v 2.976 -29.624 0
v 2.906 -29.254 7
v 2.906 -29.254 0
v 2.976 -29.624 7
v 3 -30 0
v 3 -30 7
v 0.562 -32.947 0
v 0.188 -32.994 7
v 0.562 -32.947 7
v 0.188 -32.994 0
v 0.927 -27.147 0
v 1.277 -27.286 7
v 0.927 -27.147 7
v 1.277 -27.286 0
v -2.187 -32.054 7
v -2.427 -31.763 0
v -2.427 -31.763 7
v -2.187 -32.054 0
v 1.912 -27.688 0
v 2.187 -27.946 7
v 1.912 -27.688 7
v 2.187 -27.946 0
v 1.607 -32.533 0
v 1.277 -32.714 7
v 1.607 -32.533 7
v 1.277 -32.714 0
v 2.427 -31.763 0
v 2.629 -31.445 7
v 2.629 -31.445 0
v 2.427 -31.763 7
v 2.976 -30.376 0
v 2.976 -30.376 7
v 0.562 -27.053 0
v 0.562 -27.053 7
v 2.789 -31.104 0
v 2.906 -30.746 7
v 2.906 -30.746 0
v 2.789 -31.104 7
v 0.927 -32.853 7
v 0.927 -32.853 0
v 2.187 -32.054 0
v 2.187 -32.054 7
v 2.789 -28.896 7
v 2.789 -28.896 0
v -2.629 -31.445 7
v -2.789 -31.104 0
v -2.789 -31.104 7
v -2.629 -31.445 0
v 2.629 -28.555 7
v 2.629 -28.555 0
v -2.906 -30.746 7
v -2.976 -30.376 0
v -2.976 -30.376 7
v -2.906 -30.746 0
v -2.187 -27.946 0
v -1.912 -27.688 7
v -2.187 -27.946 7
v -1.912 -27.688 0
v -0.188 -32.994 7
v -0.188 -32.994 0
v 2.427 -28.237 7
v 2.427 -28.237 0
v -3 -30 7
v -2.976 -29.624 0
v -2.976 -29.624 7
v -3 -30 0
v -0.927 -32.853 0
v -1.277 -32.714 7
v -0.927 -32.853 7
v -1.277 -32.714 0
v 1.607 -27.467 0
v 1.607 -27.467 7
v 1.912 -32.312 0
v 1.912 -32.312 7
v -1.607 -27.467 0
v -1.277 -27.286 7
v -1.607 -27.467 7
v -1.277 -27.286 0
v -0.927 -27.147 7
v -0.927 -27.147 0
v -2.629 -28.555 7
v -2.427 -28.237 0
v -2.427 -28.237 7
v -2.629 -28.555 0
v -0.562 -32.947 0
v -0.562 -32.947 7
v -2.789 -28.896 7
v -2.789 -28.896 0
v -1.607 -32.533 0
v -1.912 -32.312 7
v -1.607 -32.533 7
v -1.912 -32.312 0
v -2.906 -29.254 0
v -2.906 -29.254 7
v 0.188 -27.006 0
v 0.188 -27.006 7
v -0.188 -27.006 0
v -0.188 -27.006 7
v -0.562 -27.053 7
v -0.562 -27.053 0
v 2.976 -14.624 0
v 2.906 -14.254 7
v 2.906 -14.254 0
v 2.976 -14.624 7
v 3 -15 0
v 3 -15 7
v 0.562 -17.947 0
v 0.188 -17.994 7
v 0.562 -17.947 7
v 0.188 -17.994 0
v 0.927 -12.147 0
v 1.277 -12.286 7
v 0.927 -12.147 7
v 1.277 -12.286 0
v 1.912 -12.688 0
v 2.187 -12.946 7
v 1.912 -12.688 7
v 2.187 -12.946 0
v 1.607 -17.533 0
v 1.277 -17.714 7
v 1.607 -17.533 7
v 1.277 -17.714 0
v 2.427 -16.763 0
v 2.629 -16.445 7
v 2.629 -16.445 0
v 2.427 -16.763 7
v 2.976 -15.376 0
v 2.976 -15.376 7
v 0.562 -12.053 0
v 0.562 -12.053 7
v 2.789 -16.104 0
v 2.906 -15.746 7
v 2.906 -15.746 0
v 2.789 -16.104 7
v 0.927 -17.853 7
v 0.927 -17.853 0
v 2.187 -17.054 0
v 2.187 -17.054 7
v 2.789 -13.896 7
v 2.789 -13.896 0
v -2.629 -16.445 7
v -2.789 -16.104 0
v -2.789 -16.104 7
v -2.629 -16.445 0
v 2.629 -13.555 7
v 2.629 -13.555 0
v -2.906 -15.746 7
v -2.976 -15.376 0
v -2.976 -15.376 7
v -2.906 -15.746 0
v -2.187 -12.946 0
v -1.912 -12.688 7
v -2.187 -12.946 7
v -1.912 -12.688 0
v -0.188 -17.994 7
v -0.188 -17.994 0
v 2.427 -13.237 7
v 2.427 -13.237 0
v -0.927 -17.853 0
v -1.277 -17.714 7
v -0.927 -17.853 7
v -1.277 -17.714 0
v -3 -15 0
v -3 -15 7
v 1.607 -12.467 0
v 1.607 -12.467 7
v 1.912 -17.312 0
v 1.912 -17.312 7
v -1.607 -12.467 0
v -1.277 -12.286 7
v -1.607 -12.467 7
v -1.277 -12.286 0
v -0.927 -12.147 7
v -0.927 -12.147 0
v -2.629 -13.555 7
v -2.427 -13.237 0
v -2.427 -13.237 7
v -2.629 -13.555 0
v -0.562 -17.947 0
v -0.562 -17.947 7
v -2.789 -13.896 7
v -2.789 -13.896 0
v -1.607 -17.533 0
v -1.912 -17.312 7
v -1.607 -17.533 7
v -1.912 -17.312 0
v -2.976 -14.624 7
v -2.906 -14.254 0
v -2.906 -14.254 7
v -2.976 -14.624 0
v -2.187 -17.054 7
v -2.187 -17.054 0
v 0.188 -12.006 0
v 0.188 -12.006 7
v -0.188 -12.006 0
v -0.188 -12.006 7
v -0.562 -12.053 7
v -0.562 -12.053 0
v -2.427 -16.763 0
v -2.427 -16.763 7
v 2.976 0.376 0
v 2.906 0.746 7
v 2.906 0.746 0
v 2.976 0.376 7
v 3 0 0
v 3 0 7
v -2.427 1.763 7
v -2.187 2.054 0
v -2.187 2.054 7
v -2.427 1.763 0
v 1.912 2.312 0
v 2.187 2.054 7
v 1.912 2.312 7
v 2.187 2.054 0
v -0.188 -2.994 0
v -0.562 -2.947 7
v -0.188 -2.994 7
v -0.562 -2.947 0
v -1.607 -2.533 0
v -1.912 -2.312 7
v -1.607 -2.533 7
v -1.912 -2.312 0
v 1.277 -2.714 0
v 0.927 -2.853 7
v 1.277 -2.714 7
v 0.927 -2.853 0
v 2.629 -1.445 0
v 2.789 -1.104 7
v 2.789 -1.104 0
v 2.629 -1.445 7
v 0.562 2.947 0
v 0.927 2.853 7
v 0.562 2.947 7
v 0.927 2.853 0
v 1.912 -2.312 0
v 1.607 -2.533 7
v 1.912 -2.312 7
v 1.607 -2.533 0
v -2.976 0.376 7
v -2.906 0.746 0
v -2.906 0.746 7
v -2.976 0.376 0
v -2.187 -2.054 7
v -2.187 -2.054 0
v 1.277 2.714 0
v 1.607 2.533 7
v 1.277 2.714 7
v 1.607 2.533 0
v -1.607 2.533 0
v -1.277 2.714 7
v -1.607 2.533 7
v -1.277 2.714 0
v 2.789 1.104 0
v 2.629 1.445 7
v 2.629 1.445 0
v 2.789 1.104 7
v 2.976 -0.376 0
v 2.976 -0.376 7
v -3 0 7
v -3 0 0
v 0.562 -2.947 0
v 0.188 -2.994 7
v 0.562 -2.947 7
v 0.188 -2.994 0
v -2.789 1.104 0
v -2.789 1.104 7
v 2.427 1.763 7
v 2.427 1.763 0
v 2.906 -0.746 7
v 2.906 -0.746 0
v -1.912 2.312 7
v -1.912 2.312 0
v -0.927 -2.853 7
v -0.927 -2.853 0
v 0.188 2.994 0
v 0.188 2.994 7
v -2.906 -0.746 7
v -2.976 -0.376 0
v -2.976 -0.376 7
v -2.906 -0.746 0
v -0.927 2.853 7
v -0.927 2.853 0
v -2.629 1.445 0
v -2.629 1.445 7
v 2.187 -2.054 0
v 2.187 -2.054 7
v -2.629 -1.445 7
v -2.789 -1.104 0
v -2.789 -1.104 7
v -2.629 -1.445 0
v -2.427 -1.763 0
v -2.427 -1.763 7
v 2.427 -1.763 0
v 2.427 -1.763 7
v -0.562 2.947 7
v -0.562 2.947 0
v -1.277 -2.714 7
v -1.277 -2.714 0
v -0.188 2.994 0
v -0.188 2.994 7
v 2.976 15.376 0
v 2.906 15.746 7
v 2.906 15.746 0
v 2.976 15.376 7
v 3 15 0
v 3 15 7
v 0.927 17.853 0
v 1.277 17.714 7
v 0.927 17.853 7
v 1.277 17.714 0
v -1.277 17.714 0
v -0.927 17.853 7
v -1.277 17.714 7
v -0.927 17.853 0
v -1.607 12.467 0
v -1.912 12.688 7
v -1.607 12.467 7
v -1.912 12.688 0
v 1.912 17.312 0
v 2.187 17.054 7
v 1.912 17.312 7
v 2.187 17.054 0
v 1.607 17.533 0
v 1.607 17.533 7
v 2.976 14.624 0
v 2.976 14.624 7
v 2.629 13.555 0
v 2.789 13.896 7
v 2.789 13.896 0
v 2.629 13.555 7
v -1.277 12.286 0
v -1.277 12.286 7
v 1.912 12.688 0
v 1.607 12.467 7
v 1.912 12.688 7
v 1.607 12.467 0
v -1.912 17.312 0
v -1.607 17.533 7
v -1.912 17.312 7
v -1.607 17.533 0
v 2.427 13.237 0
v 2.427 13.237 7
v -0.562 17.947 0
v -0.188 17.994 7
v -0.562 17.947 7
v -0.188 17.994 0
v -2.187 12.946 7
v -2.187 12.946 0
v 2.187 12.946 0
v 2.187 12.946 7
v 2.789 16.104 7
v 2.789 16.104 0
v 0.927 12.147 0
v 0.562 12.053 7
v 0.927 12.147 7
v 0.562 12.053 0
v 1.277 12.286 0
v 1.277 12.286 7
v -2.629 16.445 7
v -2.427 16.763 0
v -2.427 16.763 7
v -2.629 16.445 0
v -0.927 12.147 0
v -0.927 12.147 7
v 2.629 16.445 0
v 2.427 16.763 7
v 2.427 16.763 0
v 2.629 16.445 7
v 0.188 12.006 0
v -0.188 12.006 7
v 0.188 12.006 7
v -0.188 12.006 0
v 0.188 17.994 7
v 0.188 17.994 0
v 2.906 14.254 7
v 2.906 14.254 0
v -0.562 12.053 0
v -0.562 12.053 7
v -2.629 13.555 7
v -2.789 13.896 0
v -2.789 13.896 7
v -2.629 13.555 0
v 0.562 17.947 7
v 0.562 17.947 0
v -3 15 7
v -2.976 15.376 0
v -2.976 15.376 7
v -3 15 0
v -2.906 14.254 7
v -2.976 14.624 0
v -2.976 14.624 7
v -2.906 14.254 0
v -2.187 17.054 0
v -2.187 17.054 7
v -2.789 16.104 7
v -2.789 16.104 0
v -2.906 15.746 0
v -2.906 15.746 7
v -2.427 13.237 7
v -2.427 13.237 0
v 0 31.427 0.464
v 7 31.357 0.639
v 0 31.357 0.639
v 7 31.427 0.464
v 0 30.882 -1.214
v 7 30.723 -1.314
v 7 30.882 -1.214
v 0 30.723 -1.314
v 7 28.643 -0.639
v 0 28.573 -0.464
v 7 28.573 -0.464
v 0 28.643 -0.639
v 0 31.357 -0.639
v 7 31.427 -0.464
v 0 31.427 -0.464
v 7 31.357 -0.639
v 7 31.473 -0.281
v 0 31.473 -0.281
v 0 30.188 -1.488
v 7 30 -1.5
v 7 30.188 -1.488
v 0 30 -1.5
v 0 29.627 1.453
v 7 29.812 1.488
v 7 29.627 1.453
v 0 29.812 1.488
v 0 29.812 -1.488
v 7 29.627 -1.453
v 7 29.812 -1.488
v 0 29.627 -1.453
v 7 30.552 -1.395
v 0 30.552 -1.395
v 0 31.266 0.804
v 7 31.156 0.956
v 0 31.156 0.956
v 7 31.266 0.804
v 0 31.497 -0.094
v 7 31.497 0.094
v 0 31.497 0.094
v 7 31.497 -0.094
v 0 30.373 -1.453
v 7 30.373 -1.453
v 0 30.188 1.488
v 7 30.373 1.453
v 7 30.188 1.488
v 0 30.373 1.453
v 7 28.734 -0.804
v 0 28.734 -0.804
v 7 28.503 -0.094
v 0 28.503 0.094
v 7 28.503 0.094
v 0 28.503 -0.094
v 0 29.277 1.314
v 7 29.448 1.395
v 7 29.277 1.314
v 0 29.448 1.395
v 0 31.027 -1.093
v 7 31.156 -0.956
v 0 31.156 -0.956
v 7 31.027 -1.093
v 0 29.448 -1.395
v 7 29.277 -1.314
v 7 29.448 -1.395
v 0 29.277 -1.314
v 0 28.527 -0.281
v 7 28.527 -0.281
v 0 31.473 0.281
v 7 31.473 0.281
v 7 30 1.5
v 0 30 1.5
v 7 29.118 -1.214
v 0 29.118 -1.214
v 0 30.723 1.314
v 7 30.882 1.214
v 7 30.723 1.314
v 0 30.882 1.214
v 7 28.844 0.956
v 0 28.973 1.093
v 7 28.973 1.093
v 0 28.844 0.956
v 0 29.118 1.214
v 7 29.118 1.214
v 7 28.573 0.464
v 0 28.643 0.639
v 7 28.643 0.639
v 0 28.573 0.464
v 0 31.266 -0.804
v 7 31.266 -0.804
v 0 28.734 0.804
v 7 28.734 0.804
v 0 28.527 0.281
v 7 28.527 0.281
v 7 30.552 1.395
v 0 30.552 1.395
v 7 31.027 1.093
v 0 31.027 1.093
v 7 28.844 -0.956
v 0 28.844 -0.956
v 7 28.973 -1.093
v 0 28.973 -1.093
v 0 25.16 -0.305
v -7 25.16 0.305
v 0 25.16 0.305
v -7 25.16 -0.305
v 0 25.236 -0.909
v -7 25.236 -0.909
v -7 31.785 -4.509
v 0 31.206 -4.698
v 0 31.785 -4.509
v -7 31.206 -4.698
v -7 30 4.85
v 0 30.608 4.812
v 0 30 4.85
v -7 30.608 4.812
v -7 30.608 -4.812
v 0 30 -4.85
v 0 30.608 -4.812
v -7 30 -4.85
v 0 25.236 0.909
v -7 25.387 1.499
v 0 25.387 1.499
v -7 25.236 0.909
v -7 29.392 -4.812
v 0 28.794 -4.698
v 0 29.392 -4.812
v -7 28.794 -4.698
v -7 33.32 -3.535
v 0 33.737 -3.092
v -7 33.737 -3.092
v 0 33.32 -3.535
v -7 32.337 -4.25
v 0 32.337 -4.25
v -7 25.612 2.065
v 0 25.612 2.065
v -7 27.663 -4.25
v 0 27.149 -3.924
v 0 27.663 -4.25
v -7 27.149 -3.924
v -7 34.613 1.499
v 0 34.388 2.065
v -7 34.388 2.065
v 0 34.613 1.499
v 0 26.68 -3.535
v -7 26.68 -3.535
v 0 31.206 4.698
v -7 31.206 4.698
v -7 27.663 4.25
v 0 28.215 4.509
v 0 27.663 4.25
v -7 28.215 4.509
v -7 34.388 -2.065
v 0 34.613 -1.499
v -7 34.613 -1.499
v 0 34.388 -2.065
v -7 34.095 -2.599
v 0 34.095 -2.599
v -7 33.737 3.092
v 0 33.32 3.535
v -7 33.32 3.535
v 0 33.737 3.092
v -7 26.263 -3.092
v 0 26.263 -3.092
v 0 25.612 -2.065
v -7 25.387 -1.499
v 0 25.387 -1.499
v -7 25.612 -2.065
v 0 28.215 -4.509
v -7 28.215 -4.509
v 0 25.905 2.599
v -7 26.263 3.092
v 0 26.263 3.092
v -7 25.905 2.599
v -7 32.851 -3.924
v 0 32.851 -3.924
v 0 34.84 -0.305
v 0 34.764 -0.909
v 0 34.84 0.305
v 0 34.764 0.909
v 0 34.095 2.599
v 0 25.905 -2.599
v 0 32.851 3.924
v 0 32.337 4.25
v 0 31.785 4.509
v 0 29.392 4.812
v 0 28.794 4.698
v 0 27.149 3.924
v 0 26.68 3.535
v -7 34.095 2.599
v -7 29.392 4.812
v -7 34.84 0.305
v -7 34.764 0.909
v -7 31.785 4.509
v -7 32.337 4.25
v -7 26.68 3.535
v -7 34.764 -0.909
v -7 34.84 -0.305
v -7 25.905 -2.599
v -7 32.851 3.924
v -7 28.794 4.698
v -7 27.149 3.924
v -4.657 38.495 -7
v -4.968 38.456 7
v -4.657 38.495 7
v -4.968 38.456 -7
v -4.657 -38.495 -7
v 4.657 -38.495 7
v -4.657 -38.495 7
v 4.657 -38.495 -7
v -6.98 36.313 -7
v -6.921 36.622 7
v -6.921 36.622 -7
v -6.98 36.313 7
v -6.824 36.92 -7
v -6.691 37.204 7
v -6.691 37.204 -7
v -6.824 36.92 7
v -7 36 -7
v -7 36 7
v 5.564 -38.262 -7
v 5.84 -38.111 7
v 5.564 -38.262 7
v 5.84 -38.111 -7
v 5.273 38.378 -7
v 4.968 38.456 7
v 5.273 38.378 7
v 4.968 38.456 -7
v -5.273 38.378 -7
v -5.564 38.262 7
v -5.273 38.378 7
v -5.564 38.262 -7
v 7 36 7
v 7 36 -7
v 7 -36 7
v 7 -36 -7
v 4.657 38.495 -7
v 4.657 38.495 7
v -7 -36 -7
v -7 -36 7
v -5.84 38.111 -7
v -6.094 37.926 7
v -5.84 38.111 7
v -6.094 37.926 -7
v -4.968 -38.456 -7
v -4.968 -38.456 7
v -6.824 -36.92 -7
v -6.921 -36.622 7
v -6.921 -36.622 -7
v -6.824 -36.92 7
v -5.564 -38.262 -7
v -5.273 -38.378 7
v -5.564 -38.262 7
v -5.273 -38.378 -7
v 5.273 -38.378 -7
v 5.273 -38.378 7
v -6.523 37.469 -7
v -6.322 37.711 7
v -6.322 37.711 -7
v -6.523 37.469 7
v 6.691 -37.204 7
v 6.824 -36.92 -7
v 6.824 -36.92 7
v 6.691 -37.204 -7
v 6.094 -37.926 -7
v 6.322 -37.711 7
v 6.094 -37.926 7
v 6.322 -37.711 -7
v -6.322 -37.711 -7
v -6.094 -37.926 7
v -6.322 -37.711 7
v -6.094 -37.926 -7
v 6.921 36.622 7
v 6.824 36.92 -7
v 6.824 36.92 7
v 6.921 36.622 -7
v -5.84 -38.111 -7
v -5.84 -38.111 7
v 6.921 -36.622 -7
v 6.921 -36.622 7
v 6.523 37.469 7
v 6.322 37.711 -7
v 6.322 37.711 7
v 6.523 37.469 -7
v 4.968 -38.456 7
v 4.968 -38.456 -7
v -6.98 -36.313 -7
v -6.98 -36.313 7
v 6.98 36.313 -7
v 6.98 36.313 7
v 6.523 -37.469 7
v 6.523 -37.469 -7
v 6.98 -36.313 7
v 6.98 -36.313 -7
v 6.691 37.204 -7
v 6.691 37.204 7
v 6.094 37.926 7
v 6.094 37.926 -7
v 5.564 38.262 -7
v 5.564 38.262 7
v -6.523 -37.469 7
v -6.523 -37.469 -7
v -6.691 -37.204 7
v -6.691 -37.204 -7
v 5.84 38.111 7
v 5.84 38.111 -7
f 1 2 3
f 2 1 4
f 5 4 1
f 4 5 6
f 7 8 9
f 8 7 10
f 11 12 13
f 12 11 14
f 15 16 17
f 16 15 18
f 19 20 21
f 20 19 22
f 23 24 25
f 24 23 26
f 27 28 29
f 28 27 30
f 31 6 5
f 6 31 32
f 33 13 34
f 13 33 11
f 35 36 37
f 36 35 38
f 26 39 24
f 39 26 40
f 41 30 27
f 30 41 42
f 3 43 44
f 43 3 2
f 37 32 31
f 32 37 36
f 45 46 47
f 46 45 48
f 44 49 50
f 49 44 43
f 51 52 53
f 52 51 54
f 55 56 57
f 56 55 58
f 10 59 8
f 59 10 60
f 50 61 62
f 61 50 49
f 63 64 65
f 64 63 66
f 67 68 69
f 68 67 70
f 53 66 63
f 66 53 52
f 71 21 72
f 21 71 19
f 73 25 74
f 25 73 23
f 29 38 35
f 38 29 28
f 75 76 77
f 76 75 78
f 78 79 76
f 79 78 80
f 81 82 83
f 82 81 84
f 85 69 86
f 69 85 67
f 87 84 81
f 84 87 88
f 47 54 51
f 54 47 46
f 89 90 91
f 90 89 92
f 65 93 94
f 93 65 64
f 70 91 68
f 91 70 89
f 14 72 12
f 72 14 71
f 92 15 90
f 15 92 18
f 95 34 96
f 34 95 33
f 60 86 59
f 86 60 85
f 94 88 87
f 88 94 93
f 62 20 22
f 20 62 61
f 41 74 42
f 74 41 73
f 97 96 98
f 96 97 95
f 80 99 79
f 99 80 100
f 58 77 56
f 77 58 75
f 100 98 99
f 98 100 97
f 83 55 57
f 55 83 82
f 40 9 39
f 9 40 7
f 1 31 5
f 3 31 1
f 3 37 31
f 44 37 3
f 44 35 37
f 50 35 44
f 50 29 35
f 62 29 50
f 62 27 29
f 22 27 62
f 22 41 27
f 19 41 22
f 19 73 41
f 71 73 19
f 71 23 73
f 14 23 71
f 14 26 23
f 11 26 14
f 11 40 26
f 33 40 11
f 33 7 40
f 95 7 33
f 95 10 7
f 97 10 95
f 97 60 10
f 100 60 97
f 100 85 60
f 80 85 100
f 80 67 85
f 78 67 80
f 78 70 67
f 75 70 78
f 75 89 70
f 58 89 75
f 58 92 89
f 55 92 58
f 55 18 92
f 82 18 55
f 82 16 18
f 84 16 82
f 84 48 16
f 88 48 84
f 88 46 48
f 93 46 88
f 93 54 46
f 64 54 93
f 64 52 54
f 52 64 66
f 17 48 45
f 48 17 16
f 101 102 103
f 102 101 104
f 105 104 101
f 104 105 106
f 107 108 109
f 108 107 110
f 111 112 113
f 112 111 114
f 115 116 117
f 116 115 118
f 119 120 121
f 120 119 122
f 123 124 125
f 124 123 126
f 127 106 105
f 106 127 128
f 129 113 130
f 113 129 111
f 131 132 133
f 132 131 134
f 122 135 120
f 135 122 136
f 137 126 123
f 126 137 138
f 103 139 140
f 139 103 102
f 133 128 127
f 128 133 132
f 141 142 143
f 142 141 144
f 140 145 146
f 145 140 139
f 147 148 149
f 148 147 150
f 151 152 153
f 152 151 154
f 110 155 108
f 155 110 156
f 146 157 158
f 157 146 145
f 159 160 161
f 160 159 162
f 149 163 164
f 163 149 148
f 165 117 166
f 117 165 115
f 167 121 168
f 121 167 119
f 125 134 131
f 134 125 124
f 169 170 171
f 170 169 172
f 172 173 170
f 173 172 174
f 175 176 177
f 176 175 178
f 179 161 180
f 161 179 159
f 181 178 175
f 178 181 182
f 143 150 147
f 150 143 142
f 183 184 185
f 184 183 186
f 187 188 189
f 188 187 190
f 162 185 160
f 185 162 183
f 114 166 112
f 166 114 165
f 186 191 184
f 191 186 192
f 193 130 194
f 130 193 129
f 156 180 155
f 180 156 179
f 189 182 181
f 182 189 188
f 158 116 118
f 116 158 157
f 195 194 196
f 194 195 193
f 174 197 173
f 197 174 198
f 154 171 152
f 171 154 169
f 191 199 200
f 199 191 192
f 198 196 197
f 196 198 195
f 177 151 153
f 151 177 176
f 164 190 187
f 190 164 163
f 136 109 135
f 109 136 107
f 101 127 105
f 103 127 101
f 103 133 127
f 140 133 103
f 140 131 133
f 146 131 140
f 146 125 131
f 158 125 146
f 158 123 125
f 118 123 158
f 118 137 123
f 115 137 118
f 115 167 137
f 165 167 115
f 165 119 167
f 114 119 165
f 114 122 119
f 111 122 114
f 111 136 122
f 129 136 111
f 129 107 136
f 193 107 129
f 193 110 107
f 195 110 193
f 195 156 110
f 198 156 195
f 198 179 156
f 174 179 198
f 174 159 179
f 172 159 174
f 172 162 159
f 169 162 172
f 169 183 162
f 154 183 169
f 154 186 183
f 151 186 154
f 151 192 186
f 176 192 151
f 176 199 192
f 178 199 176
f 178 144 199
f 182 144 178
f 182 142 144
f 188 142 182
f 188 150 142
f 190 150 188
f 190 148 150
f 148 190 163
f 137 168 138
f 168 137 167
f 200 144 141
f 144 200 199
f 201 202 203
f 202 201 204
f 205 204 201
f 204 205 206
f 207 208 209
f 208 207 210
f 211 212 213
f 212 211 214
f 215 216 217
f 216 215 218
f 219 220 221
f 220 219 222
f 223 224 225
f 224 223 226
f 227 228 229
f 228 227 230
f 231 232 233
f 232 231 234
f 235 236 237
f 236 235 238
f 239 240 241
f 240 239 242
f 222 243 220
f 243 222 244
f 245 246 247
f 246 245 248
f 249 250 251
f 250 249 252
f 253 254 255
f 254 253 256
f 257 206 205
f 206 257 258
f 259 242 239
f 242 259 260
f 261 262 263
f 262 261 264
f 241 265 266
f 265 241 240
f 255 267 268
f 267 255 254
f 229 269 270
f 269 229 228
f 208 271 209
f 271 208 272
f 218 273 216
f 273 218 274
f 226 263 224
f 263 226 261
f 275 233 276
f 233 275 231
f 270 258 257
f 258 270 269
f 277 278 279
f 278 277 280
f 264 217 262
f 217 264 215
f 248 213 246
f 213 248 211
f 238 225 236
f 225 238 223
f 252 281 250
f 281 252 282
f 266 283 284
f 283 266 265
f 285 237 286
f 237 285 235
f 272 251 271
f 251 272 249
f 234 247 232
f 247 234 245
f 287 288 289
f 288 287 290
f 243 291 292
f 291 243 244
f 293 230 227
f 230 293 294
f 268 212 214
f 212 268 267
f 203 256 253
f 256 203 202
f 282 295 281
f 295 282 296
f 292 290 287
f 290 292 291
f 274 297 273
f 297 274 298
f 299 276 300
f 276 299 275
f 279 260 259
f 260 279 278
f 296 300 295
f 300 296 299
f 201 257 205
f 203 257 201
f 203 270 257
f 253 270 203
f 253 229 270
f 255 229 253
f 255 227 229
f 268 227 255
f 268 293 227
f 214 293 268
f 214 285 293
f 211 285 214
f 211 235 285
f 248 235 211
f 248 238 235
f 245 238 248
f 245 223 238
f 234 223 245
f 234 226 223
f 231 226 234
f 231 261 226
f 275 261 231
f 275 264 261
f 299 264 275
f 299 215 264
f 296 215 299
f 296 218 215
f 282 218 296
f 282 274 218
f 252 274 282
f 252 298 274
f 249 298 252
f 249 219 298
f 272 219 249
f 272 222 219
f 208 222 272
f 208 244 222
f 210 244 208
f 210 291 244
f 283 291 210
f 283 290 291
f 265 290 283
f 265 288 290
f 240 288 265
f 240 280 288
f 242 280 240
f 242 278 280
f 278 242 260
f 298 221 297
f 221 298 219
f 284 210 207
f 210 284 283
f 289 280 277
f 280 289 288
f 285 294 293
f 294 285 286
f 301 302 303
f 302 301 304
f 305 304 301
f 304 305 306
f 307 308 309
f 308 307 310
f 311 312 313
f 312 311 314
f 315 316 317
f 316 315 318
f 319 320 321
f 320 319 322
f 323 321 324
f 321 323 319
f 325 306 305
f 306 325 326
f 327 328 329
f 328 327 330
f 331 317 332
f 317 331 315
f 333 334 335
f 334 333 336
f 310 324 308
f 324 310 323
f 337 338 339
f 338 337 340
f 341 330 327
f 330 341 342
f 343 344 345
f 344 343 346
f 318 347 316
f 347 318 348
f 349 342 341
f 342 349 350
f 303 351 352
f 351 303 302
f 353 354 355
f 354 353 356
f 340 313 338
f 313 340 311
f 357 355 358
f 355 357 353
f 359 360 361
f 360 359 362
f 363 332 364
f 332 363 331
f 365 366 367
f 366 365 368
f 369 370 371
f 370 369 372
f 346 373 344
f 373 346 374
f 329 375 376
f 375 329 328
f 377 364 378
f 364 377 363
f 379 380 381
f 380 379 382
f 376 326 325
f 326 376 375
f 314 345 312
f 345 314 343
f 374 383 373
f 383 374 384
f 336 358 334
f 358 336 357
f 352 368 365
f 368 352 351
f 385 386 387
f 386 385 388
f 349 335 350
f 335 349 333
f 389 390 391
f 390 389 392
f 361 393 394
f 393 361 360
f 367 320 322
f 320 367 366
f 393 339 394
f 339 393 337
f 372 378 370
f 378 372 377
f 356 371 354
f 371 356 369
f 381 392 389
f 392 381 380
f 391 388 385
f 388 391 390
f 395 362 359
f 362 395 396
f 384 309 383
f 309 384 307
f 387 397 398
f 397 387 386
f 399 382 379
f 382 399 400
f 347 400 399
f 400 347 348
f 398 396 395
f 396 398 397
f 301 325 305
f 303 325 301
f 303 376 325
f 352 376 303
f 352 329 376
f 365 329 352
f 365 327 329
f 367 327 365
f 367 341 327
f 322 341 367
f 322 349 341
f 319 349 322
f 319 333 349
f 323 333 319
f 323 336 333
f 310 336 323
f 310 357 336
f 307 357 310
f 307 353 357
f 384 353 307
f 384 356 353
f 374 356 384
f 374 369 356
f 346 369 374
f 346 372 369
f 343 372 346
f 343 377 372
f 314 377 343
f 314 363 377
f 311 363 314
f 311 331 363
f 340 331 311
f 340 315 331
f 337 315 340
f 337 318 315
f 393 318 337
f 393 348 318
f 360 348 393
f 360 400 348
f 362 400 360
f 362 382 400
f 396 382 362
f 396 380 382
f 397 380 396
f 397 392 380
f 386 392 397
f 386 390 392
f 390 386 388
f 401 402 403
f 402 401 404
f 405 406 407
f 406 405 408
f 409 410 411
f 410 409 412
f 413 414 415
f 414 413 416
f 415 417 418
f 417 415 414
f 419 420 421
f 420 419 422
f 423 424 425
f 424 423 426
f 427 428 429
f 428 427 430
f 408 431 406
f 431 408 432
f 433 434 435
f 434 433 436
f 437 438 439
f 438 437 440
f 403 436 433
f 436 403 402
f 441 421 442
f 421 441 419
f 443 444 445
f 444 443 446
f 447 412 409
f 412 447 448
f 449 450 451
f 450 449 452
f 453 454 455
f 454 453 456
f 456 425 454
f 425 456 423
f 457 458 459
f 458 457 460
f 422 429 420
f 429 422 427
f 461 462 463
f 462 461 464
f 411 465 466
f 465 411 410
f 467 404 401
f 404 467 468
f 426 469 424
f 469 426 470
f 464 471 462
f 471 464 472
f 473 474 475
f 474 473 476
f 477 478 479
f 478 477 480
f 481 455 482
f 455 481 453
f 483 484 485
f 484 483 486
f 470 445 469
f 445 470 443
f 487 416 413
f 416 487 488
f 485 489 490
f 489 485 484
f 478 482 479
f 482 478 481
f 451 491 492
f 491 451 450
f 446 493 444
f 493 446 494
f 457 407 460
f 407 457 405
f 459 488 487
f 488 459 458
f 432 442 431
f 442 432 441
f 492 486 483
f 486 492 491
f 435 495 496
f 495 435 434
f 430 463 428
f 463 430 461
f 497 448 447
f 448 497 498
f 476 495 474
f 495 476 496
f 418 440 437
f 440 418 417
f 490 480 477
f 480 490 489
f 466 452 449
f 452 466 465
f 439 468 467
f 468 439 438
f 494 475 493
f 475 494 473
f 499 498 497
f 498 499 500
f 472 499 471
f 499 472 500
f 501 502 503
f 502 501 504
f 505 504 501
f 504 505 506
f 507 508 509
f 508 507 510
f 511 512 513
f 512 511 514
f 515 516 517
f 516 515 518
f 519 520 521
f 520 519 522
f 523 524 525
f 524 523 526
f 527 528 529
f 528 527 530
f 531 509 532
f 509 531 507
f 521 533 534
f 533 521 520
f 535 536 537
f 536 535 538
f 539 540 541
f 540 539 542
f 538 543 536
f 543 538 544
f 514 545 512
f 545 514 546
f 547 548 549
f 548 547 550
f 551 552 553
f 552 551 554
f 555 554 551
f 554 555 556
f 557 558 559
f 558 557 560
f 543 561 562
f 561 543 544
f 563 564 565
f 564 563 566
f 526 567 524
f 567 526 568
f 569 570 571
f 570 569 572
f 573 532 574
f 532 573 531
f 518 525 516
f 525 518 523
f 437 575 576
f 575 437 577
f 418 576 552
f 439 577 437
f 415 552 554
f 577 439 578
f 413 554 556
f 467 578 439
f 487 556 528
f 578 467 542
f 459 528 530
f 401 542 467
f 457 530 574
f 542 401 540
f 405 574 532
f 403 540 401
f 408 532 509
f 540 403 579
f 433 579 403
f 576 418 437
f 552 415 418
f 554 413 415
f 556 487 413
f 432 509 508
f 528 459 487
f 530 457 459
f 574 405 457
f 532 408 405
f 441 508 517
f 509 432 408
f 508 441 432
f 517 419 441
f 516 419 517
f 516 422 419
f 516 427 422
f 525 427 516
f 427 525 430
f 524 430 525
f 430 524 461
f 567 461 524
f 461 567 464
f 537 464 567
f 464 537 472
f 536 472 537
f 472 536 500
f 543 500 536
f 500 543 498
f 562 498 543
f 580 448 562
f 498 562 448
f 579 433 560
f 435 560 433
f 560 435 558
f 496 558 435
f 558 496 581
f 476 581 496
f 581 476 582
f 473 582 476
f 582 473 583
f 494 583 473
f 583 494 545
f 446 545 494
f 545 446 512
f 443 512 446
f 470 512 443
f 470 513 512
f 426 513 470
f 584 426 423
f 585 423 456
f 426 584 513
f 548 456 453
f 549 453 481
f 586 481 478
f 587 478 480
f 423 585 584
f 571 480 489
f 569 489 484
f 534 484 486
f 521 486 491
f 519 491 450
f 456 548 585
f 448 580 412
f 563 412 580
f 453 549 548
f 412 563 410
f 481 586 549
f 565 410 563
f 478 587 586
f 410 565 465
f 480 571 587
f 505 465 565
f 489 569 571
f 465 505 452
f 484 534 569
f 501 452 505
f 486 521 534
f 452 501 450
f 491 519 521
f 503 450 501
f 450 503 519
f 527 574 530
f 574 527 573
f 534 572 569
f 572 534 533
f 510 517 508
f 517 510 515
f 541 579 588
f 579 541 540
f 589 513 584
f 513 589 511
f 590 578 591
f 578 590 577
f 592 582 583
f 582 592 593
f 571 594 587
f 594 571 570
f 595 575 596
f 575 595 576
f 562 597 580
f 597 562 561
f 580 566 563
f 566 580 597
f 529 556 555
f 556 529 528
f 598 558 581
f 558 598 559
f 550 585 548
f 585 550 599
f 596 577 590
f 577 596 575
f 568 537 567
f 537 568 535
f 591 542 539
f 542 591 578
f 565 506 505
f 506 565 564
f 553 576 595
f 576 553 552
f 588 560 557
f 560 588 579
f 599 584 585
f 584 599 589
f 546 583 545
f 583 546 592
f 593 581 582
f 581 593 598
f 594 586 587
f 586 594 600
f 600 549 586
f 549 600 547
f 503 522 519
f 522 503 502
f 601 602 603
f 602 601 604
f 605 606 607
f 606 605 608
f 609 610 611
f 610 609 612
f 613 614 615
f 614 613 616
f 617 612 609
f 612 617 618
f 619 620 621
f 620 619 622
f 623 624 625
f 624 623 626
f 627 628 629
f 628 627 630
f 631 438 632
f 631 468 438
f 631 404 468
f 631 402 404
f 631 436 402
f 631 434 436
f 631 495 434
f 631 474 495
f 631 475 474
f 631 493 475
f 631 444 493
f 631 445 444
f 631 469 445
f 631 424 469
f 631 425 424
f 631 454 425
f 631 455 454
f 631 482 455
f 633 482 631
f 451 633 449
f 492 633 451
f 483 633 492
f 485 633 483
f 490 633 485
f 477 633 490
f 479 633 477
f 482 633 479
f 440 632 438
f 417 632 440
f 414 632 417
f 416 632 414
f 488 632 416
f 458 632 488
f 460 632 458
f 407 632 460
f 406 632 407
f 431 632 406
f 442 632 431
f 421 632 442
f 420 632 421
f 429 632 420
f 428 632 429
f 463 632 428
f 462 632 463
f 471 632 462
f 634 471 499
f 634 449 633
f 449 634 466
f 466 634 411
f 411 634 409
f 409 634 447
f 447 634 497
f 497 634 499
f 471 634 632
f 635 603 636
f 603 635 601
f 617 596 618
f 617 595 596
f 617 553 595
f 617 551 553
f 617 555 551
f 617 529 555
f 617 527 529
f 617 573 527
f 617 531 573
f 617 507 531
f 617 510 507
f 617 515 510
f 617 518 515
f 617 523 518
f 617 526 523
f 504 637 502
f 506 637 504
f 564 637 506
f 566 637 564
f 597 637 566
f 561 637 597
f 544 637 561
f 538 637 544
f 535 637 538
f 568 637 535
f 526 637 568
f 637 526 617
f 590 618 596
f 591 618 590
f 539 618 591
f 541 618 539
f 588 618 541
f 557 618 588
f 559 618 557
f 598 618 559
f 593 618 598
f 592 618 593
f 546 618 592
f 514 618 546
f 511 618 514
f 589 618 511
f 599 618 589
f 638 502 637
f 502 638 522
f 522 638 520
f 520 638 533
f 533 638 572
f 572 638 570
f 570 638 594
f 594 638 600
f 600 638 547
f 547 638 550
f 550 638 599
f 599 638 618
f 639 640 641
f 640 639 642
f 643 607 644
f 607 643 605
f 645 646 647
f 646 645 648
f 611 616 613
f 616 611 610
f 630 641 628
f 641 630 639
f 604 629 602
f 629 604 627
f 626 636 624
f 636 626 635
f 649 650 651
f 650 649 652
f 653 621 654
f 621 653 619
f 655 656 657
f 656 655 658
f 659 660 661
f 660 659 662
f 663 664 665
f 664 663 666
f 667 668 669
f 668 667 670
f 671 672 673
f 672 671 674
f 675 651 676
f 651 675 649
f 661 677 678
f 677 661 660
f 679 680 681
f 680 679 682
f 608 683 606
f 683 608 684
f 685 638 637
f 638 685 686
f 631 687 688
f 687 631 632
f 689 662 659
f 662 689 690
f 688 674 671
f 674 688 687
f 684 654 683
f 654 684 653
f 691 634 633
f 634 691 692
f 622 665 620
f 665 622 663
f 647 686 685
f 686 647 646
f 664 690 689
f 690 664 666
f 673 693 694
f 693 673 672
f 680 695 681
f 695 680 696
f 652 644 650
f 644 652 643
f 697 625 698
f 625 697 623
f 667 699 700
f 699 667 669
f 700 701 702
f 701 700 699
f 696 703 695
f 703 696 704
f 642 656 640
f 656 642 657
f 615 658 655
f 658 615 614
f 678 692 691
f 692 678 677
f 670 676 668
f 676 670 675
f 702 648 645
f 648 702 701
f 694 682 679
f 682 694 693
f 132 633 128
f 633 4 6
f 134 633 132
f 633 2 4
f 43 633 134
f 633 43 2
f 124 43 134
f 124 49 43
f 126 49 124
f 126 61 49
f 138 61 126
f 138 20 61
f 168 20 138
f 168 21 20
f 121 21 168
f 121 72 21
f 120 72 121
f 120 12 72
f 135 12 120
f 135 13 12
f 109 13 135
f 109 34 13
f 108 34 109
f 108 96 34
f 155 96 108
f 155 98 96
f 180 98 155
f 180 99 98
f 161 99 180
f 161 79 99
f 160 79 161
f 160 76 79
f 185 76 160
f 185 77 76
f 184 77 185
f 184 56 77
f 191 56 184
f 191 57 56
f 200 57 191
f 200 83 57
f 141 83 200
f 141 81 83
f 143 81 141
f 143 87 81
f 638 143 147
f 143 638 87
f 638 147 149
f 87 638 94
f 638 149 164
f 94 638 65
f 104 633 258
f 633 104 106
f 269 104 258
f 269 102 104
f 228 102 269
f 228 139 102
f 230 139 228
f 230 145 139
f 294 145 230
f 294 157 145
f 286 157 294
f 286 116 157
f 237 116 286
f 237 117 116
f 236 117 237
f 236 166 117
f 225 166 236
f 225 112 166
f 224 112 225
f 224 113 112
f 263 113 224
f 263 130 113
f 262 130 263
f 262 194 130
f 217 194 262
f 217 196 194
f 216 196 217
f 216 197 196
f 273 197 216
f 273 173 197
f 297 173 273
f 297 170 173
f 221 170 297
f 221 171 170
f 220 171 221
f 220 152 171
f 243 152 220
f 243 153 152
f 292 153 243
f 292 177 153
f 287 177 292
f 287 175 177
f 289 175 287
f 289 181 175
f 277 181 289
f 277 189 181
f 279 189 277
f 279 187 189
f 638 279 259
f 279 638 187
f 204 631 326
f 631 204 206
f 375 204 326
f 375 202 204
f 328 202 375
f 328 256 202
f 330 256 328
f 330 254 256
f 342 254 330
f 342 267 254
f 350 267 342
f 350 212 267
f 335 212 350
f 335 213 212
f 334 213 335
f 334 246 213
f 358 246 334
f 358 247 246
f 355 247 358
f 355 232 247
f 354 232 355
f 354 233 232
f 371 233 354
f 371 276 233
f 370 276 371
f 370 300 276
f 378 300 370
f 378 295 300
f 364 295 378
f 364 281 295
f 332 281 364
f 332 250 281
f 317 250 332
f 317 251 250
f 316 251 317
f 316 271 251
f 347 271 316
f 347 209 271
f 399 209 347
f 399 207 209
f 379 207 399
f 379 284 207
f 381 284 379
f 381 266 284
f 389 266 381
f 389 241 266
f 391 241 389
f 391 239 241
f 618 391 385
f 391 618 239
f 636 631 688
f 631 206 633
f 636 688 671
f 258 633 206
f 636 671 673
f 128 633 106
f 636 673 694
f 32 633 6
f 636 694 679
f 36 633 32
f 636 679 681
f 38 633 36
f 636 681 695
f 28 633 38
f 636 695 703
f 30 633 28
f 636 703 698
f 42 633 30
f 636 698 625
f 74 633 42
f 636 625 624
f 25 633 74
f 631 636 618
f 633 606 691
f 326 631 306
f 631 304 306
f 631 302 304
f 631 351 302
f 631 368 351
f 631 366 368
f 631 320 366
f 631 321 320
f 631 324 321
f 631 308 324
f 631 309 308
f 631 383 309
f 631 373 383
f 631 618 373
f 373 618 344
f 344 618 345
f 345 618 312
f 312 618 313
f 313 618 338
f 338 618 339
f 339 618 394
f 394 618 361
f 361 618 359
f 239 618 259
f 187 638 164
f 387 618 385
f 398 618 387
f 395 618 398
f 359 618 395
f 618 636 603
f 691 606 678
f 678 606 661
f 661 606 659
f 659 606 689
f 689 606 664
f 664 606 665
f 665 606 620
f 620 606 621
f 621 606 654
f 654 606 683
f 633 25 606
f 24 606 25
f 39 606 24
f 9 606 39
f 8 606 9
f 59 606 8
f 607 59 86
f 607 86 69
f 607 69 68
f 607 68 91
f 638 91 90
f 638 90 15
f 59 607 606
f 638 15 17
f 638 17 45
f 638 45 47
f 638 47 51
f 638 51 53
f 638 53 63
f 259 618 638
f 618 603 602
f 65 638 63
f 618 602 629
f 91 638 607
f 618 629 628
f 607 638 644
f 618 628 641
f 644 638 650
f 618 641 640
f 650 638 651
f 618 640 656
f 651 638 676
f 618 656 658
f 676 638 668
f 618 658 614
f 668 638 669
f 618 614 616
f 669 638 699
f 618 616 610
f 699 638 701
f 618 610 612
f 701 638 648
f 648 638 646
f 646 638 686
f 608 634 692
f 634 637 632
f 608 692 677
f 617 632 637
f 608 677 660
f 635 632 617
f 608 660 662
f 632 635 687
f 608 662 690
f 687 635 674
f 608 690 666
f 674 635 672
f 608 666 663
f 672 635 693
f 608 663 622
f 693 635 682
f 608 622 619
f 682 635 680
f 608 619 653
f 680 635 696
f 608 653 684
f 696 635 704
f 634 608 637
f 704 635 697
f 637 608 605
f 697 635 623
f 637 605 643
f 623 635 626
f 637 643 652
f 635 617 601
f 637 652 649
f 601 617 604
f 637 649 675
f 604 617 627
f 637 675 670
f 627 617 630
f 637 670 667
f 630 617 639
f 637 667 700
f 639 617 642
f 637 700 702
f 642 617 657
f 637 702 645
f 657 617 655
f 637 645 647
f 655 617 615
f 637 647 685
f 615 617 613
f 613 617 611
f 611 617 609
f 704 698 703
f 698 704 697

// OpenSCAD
$fn = 50;


difference() {
	union() {
		translate(v = [0, 0, -7.0000000000]) {
			hull() {
				translate(v = [-4.5000000000, 36.0000000000, 0]) {
					cylinder(h = 14, r = 2.5000000000);
				}
				translate(v = [4.5000000000, 36.0000000000, 0]) {
					cylinder(h = 14, r = 2.5000000000);
				}
				translate(v = [-4.5000000000, -36.0000000000, 0]) {
					cylinder(h = 14, r = 2.5000000000);
				}
				translate(v = [4.5000000000, -36.0000000000, 0]) {
					cylinder(h = 14, r = 2.5000000000);
				}
			}
		}
	}
	union() {
		translate(v = [0.0000000000, -30.0000000000, 0]) {
			cylinder(h = 100, r = 3.0000000000);
		}
		translate(v = [0.0000000000, -15.0000000000, 0]) {
			cylinder(h = 100, r = 3.0000000000);
		}
		cylinder(h = 100, r = 3.0000000000);
		translate(v = [0.0000000000, 15.0000000000, 0]) {
			cylinder(h = 100, r = 3.0000000000);
		}
		translate(v = [-50, 30, 0]) {
			rotate(a = [0, 90, 0]) {
				cylinder(h = 100, r = 1.5000000000);
			}
		}
		translate(v = [-100, 30, 0]) {
			rotate(a = [0, 90, 0]) {
				cylinder(h = 100, r = 4.8500000000);
			}
		}
	}
}
